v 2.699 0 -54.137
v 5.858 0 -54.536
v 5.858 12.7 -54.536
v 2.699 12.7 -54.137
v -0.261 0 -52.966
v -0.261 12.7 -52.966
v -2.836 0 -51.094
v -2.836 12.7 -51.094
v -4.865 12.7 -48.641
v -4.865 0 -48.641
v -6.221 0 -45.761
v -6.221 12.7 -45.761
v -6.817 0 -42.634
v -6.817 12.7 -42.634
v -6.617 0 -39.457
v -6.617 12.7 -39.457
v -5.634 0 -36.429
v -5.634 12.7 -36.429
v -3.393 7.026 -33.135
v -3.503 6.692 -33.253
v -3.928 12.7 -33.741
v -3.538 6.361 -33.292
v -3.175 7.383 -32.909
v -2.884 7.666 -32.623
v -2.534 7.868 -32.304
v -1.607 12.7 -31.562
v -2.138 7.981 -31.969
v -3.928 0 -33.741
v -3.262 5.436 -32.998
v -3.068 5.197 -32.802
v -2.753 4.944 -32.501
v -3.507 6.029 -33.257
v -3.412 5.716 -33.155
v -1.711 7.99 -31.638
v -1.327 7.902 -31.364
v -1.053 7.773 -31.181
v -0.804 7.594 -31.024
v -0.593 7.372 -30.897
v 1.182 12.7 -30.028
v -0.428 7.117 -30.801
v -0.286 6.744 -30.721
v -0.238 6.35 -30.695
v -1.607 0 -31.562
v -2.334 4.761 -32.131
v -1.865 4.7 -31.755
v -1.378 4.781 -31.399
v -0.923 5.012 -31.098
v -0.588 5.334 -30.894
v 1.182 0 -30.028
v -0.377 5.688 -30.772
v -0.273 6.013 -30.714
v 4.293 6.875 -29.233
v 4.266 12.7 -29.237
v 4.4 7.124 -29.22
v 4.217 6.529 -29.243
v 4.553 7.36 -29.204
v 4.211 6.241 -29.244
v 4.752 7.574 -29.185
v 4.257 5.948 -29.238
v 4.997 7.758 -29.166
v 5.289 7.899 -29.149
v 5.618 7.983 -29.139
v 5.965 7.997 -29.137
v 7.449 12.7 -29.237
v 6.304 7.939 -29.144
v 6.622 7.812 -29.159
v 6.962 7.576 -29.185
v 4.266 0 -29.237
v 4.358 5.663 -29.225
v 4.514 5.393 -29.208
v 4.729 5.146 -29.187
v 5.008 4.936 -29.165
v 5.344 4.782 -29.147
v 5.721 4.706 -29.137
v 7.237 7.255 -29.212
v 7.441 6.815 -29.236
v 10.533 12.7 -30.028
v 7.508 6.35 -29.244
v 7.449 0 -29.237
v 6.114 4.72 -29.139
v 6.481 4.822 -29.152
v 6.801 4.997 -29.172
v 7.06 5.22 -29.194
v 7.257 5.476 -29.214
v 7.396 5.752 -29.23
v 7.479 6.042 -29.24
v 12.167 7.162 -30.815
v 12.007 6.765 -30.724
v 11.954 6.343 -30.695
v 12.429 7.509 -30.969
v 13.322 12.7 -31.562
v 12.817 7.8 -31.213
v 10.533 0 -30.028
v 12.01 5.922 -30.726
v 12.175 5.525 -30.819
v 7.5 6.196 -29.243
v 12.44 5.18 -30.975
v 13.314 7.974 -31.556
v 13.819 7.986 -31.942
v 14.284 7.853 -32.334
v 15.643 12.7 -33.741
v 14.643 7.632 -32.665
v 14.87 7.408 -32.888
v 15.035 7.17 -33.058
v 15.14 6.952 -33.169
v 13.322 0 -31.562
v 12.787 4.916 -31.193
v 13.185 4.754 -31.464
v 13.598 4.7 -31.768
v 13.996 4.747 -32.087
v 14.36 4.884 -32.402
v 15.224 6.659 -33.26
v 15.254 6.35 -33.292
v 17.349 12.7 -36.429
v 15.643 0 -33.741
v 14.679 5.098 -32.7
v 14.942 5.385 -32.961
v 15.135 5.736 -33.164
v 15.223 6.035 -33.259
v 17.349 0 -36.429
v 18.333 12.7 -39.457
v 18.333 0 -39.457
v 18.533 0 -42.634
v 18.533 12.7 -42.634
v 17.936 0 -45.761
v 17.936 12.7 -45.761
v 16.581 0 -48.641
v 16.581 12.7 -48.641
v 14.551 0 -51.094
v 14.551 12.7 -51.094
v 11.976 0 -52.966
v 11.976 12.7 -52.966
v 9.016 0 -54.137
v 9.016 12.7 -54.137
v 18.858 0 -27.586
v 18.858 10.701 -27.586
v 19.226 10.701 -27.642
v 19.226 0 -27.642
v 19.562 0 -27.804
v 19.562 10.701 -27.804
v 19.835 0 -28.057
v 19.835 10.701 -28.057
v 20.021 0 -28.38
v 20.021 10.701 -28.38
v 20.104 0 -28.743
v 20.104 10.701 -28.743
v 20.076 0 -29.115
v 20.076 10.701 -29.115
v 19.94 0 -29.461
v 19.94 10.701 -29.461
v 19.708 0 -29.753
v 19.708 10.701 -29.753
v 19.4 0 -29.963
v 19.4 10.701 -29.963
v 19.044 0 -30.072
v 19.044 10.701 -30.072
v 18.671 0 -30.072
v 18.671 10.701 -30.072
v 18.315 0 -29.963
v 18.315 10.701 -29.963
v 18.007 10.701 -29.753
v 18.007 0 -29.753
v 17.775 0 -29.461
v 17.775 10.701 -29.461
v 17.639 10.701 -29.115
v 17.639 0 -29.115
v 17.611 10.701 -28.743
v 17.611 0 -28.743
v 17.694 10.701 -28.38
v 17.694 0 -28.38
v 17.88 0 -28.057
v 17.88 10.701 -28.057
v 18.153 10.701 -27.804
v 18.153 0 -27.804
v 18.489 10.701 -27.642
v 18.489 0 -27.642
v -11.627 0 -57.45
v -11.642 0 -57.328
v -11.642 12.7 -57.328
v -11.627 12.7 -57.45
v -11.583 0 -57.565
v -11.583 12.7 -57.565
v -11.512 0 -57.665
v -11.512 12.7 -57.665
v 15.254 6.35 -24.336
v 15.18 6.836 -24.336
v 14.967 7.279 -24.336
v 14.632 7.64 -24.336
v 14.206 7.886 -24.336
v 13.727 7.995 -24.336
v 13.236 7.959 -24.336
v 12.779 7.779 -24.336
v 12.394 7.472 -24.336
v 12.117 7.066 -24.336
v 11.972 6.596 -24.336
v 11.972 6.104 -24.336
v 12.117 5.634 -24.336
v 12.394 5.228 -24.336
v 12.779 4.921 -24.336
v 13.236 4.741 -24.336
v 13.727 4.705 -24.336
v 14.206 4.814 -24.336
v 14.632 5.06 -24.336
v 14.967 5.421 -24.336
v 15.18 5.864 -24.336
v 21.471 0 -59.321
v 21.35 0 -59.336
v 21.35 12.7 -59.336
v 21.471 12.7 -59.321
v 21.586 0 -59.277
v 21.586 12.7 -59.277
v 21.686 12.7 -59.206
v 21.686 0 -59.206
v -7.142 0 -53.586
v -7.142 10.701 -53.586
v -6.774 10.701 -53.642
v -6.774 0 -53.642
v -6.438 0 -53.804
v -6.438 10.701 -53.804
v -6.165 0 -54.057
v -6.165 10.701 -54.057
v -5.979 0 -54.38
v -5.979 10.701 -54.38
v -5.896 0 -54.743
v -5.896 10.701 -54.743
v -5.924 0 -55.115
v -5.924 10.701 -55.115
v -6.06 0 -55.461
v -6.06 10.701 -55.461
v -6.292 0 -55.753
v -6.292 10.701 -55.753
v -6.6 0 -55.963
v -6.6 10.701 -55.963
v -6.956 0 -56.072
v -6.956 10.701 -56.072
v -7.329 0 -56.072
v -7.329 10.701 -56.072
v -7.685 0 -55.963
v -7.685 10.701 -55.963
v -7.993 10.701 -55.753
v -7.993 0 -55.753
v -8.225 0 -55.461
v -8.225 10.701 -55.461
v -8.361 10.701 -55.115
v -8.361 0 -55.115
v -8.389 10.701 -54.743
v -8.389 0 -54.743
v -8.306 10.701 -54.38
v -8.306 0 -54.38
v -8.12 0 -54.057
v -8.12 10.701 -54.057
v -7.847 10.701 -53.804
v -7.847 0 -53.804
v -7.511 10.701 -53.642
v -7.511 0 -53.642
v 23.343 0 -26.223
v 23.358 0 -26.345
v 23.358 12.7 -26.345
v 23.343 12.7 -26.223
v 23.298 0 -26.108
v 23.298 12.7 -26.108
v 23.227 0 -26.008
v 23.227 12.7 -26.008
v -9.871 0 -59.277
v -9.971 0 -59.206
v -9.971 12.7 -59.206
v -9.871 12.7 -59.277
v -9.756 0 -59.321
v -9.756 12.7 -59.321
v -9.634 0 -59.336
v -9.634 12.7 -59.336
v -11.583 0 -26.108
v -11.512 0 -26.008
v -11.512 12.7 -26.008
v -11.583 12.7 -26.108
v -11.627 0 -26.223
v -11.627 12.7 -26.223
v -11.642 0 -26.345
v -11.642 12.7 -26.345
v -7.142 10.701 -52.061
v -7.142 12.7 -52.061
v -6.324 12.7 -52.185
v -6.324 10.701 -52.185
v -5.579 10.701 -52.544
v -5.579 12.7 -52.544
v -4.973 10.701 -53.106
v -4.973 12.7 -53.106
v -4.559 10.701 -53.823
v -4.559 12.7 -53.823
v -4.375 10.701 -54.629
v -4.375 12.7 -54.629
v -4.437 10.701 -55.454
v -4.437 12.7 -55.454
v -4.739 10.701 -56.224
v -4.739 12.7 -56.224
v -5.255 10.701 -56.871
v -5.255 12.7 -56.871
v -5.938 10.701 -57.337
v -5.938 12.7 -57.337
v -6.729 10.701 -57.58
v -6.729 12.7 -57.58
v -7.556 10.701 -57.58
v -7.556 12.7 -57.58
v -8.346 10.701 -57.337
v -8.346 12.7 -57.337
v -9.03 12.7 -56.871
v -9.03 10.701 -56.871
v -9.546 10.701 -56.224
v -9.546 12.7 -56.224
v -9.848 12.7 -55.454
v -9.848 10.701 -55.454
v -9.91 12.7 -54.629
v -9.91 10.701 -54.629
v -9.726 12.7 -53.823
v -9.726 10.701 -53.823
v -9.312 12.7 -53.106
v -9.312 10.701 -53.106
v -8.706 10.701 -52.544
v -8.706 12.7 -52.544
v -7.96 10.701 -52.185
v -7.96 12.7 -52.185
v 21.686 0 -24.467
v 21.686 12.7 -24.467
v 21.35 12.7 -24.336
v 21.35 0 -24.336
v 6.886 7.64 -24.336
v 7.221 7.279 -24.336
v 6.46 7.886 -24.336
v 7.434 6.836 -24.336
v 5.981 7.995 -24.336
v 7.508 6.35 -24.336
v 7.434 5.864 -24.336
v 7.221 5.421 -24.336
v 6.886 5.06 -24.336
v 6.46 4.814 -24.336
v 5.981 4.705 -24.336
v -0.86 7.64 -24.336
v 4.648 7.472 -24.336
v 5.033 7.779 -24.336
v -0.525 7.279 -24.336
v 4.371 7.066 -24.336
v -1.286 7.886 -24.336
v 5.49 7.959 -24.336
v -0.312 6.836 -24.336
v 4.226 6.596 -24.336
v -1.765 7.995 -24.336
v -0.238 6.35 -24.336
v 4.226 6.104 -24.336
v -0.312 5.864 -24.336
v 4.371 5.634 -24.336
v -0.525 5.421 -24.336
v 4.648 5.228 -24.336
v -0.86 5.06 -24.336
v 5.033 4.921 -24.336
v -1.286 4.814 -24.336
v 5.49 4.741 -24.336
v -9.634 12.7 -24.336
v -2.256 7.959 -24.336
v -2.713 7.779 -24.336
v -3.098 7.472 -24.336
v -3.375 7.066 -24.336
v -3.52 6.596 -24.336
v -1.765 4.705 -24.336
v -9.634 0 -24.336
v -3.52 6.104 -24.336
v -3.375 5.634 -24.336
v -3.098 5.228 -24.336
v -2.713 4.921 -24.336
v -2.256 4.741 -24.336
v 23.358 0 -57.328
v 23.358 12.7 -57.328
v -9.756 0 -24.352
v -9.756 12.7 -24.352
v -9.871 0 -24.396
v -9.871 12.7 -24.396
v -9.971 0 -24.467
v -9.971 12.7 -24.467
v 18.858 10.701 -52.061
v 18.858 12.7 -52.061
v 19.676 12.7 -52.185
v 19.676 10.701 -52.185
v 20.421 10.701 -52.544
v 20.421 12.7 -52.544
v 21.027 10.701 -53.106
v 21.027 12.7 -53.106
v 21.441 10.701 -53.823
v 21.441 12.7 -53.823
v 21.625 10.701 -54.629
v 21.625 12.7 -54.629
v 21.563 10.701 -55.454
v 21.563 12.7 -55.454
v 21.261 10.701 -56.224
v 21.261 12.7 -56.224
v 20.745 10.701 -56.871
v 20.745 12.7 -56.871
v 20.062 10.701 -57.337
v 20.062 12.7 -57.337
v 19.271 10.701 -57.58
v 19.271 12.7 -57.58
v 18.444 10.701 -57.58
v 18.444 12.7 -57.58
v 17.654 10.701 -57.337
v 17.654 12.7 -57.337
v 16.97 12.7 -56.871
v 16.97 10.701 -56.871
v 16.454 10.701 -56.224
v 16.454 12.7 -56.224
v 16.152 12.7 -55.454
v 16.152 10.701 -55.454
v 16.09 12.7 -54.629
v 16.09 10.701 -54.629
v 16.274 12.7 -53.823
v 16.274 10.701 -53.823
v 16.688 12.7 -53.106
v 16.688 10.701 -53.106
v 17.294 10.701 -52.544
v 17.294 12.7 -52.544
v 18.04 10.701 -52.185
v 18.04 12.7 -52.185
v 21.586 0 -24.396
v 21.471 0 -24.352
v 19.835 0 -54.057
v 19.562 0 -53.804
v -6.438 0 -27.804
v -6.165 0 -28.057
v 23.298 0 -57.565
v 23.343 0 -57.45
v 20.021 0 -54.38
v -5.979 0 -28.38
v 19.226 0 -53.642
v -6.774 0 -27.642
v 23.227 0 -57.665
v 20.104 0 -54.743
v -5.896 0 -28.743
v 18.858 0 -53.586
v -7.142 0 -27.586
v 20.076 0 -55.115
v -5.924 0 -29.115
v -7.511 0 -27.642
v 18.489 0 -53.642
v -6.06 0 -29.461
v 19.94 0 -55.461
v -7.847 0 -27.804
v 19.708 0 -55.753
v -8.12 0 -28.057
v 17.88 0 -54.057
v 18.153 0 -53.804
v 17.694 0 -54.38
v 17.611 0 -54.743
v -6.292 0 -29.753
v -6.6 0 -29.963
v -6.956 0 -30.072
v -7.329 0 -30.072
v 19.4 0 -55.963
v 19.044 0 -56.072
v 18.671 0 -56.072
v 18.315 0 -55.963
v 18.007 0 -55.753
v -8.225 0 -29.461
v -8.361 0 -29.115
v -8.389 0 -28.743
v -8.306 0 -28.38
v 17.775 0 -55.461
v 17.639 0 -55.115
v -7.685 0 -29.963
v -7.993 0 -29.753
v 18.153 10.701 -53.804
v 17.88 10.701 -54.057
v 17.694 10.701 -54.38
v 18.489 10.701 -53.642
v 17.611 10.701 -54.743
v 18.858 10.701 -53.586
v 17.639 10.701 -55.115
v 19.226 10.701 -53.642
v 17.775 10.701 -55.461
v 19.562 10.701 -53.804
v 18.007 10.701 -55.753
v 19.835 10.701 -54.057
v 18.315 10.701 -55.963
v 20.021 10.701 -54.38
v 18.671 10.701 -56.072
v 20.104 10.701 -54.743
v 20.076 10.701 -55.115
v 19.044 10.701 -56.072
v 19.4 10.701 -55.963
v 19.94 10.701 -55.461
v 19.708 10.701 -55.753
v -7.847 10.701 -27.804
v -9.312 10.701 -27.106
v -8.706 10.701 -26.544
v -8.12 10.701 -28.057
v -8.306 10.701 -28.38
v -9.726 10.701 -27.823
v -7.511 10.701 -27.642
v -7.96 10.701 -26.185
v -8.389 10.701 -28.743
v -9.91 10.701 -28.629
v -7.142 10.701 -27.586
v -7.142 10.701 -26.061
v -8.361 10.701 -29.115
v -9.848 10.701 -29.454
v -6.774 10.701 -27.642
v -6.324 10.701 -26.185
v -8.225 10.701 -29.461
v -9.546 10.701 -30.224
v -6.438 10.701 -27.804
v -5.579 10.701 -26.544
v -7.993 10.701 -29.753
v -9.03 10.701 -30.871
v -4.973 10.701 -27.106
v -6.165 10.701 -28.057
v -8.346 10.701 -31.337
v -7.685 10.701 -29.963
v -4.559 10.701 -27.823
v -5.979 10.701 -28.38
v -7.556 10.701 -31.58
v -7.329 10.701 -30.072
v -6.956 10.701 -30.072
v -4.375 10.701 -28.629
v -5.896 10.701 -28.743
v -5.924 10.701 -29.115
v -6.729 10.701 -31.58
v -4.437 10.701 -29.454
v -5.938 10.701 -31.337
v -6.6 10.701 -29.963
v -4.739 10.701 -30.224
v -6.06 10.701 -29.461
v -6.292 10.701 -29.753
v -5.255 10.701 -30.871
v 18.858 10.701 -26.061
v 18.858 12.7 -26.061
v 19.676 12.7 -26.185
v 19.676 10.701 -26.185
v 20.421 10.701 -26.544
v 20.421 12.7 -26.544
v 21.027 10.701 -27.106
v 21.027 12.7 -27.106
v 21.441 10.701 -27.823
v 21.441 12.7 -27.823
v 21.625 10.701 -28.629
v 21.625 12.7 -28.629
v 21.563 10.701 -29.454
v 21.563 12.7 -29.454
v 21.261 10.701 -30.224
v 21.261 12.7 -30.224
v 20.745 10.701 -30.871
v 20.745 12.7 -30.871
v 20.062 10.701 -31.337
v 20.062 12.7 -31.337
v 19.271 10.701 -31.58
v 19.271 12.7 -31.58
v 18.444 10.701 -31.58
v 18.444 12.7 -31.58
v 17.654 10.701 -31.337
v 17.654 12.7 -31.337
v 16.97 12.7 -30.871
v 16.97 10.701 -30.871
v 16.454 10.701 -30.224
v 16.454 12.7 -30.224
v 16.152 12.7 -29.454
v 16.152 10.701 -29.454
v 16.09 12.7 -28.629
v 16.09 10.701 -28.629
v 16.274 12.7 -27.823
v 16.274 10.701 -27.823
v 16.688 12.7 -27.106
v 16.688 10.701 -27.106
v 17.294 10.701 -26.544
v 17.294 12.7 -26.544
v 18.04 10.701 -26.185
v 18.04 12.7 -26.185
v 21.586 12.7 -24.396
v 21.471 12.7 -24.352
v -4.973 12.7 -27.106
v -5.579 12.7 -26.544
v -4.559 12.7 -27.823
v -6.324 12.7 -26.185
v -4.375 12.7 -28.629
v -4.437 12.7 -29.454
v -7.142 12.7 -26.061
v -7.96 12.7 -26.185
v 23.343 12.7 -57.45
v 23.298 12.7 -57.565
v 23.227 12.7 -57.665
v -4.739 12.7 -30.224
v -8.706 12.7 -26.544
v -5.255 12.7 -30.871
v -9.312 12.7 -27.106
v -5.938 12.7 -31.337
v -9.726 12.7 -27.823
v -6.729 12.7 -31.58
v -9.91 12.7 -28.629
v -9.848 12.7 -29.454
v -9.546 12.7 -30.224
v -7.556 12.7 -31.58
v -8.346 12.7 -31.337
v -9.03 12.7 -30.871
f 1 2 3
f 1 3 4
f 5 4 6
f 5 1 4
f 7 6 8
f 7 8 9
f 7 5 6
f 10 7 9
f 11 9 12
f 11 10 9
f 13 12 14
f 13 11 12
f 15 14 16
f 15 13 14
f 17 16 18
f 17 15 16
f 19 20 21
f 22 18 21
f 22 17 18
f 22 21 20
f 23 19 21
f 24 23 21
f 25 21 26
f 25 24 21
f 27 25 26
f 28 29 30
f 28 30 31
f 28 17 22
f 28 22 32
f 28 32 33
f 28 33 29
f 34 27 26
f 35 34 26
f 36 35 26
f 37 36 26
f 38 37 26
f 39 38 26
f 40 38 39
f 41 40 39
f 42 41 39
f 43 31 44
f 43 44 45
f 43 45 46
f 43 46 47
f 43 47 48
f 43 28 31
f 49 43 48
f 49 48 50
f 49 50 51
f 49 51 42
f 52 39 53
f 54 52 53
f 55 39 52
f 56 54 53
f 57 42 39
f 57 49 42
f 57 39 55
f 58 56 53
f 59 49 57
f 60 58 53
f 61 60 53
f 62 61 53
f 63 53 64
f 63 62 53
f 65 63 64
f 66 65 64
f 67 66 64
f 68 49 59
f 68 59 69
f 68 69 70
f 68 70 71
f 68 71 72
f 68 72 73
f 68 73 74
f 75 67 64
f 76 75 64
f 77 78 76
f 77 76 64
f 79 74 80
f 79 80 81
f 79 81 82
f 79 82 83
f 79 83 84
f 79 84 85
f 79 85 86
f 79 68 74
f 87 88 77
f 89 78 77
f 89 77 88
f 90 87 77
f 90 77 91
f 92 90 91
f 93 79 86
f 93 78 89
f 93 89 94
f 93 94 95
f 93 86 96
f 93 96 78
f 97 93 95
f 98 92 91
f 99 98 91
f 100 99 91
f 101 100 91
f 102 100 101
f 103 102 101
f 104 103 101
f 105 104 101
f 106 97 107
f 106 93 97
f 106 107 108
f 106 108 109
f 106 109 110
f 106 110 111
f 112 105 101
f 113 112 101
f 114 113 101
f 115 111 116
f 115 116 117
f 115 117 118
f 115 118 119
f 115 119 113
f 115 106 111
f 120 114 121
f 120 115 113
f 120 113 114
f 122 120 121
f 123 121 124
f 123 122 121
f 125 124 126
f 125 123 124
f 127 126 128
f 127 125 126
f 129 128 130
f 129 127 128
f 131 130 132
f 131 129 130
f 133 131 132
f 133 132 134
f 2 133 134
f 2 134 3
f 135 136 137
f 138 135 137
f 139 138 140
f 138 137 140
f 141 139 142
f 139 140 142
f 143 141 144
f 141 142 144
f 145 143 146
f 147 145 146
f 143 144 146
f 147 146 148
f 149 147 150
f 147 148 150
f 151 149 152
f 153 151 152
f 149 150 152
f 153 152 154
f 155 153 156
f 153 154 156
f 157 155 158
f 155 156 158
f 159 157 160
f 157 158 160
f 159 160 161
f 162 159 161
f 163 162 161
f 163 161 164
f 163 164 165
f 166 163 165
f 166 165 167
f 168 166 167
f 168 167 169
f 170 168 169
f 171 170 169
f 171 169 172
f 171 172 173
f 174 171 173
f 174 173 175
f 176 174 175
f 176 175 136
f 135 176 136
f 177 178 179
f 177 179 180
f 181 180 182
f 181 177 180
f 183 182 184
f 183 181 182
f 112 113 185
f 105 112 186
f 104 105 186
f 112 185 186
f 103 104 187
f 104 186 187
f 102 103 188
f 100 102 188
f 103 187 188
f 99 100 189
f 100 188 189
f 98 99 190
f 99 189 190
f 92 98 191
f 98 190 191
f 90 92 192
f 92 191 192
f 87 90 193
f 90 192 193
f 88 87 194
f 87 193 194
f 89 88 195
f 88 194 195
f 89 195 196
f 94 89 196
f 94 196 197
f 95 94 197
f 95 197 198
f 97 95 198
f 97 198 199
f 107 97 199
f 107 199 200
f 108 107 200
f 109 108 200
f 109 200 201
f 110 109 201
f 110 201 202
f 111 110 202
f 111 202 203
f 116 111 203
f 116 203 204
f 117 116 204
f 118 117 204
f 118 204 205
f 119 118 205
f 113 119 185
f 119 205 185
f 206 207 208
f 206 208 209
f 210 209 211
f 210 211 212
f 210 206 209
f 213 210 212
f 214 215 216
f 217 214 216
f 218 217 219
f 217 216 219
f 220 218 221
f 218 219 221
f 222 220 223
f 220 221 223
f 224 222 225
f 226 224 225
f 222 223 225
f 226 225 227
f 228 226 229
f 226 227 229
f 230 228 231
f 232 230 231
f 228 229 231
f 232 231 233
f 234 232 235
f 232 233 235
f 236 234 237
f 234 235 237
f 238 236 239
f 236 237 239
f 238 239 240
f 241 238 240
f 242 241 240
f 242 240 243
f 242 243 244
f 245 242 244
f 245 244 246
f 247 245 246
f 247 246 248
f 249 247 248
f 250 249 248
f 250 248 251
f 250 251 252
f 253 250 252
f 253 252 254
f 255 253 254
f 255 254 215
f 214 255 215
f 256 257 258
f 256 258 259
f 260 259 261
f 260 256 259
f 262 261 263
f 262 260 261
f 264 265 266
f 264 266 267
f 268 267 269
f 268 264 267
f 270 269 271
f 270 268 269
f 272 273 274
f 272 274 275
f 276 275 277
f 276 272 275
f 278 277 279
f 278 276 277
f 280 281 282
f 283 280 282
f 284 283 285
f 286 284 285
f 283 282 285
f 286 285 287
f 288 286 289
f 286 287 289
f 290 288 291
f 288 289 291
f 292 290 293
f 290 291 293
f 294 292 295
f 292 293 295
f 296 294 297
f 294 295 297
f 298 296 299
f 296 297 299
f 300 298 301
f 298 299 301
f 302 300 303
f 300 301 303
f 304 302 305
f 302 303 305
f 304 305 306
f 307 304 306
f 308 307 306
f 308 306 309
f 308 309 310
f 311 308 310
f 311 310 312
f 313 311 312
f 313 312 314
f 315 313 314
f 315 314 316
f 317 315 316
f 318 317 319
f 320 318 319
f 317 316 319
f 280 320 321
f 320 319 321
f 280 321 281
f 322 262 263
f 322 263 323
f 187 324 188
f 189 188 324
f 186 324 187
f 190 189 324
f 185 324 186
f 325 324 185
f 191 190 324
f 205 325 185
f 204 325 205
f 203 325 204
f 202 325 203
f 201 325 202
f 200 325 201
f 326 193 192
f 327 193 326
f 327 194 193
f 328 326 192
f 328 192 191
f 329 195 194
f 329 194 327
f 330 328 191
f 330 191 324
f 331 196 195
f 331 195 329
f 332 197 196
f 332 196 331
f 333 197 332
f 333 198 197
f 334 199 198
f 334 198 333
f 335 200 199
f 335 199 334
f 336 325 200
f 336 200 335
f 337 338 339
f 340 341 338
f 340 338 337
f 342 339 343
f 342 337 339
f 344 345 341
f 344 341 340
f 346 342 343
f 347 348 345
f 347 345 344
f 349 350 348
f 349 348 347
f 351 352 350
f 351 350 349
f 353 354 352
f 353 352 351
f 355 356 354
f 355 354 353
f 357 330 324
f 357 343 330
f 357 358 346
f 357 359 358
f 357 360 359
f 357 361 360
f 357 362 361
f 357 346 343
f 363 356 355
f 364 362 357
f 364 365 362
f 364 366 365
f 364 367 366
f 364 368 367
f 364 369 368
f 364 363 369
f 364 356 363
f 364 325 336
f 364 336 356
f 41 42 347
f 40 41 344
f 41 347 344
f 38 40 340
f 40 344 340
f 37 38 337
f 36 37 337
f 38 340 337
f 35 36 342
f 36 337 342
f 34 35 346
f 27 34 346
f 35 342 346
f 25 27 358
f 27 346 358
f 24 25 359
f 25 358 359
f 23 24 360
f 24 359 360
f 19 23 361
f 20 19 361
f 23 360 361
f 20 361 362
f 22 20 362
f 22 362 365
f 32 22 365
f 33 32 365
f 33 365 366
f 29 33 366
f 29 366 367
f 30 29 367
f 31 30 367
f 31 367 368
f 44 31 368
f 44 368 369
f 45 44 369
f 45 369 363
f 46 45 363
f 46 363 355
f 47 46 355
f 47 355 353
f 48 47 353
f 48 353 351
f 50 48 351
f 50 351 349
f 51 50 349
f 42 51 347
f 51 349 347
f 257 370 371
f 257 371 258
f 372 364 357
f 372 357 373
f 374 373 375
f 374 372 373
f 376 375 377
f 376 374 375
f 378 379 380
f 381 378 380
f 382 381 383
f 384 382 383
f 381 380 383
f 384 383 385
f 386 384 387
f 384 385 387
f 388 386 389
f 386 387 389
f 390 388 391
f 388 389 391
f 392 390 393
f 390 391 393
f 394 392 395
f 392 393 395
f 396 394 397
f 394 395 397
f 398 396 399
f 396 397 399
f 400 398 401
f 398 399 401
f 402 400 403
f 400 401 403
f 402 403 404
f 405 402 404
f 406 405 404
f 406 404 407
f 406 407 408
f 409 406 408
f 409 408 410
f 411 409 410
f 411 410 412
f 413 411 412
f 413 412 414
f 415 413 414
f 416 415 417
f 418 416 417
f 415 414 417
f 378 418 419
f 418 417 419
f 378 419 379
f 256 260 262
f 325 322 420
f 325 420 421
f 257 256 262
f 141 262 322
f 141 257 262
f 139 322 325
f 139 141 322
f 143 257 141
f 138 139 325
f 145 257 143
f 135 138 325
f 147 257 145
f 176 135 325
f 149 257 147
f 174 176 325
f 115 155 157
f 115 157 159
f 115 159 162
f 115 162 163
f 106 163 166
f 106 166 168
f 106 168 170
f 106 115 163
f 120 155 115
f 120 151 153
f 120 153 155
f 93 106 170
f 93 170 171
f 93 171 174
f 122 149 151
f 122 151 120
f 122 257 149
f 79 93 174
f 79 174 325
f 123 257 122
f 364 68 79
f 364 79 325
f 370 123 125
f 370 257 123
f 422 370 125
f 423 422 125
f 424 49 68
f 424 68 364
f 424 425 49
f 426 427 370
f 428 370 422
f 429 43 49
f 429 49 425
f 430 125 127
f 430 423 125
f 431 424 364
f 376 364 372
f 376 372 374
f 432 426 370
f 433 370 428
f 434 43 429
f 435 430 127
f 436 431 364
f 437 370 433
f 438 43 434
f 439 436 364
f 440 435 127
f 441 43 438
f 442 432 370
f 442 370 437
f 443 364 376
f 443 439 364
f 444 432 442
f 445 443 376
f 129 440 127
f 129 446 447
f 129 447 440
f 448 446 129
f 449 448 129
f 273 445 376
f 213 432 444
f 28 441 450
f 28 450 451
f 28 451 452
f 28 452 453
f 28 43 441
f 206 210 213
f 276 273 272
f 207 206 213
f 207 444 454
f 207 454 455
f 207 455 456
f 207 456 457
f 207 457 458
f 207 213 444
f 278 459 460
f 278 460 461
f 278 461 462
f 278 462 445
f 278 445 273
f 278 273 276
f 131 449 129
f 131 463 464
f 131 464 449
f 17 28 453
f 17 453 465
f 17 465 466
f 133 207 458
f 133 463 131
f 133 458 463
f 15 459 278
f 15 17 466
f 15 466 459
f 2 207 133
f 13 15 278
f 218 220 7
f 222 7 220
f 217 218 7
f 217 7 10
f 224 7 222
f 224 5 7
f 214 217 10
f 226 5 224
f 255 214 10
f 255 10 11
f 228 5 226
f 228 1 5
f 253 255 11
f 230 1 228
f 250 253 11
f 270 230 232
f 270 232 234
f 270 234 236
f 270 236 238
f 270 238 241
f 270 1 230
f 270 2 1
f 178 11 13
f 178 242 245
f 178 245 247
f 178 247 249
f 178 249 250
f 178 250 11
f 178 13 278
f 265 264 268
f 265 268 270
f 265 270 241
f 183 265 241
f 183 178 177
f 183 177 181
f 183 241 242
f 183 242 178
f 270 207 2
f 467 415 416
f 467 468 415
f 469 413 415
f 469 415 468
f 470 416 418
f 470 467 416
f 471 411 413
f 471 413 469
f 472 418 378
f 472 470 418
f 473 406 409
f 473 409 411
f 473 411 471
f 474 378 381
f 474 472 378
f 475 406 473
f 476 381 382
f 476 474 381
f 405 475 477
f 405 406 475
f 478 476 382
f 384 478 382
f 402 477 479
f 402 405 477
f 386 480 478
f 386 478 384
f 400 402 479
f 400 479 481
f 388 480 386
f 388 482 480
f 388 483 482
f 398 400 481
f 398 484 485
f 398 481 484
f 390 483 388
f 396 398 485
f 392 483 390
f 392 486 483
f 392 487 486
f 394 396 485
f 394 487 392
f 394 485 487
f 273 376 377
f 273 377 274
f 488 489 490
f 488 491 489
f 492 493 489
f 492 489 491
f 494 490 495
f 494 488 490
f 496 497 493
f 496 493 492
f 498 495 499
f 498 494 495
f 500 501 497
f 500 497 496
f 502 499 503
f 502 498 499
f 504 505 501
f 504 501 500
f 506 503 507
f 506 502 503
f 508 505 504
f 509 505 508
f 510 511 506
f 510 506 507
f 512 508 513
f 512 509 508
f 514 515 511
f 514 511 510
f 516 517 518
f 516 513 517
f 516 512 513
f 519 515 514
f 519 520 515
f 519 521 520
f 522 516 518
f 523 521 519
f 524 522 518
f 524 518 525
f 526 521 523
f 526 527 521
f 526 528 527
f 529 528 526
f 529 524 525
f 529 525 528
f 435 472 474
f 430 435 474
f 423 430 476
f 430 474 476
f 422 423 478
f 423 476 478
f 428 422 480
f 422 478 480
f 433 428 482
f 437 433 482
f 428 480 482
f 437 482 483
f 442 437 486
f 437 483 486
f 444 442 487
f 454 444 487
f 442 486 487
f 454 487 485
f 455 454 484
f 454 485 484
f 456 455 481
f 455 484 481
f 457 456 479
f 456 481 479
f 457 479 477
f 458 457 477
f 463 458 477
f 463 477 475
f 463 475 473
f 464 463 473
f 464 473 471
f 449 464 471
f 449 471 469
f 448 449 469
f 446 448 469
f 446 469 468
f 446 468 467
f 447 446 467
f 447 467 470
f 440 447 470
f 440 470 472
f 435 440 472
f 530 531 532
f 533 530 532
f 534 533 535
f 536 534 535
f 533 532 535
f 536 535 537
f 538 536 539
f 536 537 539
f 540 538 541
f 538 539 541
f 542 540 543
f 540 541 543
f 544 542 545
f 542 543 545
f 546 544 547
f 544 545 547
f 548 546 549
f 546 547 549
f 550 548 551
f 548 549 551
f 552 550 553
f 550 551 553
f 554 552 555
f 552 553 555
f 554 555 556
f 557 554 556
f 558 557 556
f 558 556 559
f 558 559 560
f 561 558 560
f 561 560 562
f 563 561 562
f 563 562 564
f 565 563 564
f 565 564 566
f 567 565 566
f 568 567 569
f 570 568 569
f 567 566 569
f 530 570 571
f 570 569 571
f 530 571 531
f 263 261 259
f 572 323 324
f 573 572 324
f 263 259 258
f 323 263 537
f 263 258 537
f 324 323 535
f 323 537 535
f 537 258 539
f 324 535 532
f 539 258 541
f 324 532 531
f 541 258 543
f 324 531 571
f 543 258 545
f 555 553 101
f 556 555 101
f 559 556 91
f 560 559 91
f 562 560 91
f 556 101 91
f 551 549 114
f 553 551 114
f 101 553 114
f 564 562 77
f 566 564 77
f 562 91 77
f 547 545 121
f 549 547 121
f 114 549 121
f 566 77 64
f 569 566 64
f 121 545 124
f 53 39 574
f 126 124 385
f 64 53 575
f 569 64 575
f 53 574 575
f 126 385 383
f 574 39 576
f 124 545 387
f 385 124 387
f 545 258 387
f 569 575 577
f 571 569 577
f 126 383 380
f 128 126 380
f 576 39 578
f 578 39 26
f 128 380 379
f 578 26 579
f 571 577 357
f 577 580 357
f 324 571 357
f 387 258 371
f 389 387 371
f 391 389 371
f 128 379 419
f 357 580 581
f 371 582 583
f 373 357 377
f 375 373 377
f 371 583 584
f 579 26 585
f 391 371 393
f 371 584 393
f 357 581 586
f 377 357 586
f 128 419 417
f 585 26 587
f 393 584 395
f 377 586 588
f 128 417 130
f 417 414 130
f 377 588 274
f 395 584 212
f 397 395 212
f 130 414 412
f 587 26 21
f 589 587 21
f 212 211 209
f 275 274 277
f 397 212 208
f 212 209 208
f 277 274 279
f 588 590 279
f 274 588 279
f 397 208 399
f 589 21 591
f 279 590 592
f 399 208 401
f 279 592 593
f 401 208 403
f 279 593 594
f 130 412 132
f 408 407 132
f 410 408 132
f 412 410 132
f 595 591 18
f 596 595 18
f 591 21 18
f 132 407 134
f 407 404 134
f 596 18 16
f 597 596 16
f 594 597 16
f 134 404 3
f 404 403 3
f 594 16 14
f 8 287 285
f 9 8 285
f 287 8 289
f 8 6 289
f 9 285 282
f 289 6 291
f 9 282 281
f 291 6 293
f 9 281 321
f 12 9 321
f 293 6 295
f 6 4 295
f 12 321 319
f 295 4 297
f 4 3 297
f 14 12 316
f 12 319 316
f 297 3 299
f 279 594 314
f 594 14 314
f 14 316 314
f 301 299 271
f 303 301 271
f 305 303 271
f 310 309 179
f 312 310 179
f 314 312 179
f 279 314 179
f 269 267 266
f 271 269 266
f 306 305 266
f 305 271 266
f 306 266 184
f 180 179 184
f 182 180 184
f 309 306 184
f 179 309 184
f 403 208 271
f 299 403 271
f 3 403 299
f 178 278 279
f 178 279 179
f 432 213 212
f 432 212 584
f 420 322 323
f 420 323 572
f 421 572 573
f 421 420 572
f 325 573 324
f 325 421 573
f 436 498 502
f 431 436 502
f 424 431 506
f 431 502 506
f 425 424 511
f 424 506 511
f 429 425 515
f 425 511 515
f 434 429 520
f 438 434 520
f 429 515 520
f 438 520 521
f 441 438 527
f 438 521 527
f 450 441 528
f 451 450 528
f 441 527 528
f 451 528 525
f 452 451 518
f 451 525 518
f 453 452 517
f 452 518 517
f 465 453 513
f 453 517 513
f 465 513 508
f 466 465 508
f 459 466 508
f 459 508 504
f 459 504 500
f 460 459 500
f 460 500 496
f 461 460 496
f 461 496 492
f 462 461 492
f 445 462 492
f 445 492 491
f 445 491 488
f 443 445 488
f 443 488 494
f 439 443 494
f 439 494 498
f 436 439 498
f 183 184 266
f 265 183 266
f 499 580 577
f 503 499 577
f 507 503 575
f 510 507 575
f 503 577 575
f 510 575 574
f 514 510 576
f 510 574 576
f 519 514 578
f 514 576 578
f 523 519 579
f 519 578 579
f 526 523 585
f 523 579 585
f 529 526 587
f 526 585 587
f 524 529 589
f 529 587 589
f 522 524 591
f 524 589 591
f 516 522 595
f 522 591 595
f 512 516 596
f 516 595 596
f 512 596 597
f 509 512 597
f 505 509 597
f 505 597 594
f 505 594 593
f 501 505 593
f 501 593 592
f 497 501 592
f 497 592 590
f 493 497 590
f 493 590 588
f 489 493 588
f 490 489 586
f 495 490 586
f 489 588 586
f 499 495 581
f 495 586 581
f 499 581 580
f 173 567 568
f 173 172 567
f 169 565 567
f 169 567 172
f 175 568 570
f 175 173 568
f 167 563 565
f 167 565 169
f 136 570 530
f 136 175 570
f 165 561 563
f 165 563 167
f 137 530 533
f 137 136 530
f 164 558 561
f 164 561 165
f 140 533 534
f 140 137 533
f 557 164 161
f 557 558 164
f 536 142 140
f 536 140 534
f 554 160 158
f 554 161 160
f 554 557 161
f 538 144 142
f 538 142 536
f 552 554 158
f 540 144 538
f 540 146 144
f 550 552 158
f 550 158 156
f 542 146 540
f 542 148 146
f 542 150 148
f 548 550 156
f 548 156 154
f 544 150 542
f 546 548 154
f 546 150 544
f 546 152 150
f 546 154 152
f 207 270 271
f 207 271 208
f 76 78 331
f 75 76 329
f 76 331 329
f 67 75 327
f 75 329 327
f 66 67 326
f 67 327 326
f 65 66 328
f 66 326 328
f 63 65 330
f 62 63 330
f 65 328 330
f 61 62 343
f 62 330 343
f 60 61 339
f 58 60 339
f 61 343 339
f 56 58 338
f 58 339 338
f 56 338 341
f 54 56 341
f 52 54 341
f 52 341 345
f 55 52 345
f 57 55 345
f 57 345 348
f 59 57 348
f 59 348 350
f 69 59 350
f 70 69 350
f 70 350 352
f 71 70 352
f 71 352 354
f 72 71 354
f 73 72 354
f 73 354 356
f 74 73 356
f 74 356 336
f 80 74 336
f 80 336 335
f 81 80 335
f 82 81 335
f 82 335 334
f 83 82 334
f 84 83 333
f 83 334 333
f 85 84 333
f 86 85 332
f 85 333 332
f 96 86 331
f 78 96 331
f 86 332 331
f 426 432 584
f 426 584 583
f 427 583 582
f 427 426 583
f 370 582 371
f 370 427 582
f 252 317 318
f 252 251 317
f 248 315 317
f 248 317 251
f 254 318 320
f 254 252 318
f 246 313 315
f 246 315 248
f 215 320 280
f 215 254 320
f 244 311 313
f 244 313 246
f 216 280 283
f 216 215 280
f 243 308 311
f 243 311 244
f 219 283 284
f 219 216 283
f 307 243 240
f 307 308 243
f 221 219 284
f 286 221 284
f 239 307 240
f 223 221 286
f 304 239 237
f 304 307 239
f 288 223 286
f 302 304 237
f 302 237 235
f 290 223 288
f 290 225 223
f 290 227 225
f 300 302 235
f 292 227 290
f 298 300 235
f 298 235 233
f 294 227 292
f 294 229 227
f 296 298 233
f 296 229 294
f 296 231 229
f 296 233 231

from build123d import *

# Parameters (mm, degrees)
SKETCH1_R           = 12.7
SKETCH1_R_2         = 1.65
BOSS_EXTRUDE1_DEPTH = 12.7
SKETCH2_R           = 1.65
CUT_EXTRUDE1_DEPTH  = 12.7
SKETCH3_R           = 2.77495
CUT_EXTRUDE3_DEPTH  = 1.99898
SKETCH7_R           = 1.65
BOSS_EXTRUDE2_DEPTH = 10.70102
SKETCH8_R           = 1.65
BOSS_EXTRUDE3_DEPTH = 10.70102
SKETCH9_R           = 1.65
BOSS_EXTRUDE4_DEPTH = 10.70102
SKETCH10_R          = 1.65
BOSS_EXTRUDE5_DEPTH = 10.70102
SKETCH12_R          = 1.25
CUT_EXTRUDE4_DEPTH  = 12.7
SKETCH11_R          = 1.25
CUT_EXTRUDE5_DEPTH  = 12.7


with BuildPart() as part:
    # Sketch1 → Boss-Extrude1 (new body)
    with BuildSketch(Plane(origin=(0, 0, 0), x_dir=(1, 0, 0), z_dir=(0, 1, 0))):
        with BuildLine():
            Line((21.686311219, 59.206008809), (23.227161891, 57.665158137))
            ThreePointArc((23.227161891, 57.665158137), (23.323849078, 57.508955756), (23.357596674, 57.328376976))
            Line((23.357596674, 57.328376976), (23.357596674, 26.344510207))
            ThreePointArc((23.357596674, 26.344510207), (23.323849078, 26.163931427), (23.227161891, 26.007729046))
            Line((23.227161891, 26.007729046), (21.686311219, 24.466878374))
            ThreePointArc((21.686311219, 24.466878374), (21.530108838, 24.370191187), (21.349530059, 24.336443591))
            Line((21.349530059, 24.336443591), (-9.634336711, 24.336443591))
            ThreePointArc((-9.634336711, 24.336443591), (-9.814915491, 24.370191187), (-9.971117871, 24.466878374))
            Line((-9.971117871, 24.466878374), (-11.511968543, 26.007729046))
            ThreePointArc((-11.511968543, 26.007729046), (-11.60865573, 26.163931427), (-11.642403326, 26.344510207))
            Line((-11.642403326, 26.344510207), (-11.642403326, 57.328376976))
            ThreePointArc((-11.642403326, 57.328376976), (-11.60865573, 57.508955756), (-11.511968543, 57.665158137))
            Line((-11.511968543, 57.665158137), (-9.971117871, 59.206008809))
            ThreePointArc((-9.971117871, 59.206008809), (-9.814915491, 59.302695995), (-9.634336711, 59.336443591))
            Line((-9.634336711, 59.336443591), (21.349530059, 59.336443591))
            ThreePointArc((21.349530059, 59.336443591), (21.530108838, 59.302695995), (21.686311219, 59.206008809))
        make_face()
        with Locations(Location((5.857596674, 41.836443591, 0), (0, 0, 90))):
            Circle(SKETCH1_R, mode=Mode.SUBTRACT)
        with Locations(Location((18.857596674, 54.836443591, 0), (0, 0, 90))):
            Circle(SKETCH1_R_2, mode=Mode.SUBTRACT)
        with Locations(Location((18.857596674, 28.836443591, 0), (0, 0, 90))):
            Circle(SKETCH1_R_2, mode=Mode.SUBTRACT)
        with Locations(Location((-7.142403326, 54.836443591, 0), (0, 0, 90))):
            Circle(SKETCH1_R_2, mode=Mode.SUBTRACT)
        with Locations(Location((-7.142403326, 28.836443591, 0), (0, 0, 90))):
            Circle(SKETCH1_R_2, mode=Mode.SUBTRACT)
    extrude(amount=BOSS_EXTRUDE1_DEPTH)

    # Sketch2 → Cut-Extrude1 (cut)
    with BuildSketch(Plane.XY.offset(-24.336443591)):
        with Locations((-1.888370018, 6.35)):
            Circle(SKETCH2_R)
        with Locations((13.603563366, 6.35)):
            Circle(SKETCH2_R)
        with Locations((5.857596674, 6.35)):
            Circle(SKETCH2_R)
    extrude(amount=-CUT_EXTRUDE1_DEPTH, mode=Mode.SUBTRACT)

    # Sketch3 → Cut-Extrude3 (cut)
    with BuildSketch(Plane(origin=(0, 12.7, 0), x_dir=(1, 0, 0), z_dir=(0, 1, 0))):
        with Locations(Location((-7.142403326, 54.836443591, 0), (0, 0, 270))):
            Circle(SKETCH3_R)
        with Locations(Location((18.857596674, 54.836443591, 0), (0, 0, 270))):
            Circle(SKETCH3_R)
        with Locations(Location((-7.142403326, 28.836443591, 0), (0, 0, 270))):
            Circle(SKETCH3_R)
        with Locations(Location((18.857596674, 28.836443591, 0), (0, 0, 270))):
            Circle(SKETCH3_R)
    extrude(amount=-CUT_EXTRUDE3_DEPTH, mode=Mode.SUBTRACT)

    # Sketch7 → Boss-Extrude2 (add, through all)
    with BuildSketch(Plane(origin=(0, 10.70102, 0), x_dir=(1, 0, 0), z_dir=(0, 1, 0))):
        with Locations((-7.142403326, 28.836443591)):
            Circle(SKETCH7_R)
    extrude(amount=-BOSS_EXTRUDE2_DEPTH)

    # Sketch8 → Boss-Extrude3 (add, through all)
    with BuildSketch(Plane(origin=(0, 10.70102, 0), x_dir=(1, 0, 0), z_dir=(0, 1, 0))):
        with Locations((-7.142403326, 54.836443591)):
            Circle(SKETCH8_R)
    extrude(amount=-BOSS_EXTRUDE3_DEPTH)

    # Sketch9 → Boss-Extrude4 (add, through all)
    with BuildSketch(Plane(origin=(0, 10.70102, 0), x_dir=(1, 0, 0), z_dir=(0, 1, 0))):
        with Locations((18.857596674, 54.836443591)):
            Circle(SKETCH9_R)
    extrude(amount=-BOSS_EXTRUDE4_DEPTH)

    # Sketch10 → Boss-Extrude5 (add, through all)
    with BuildSketch(Plane(origin=(0, 10.70102, 0), x_dir=(1, 0, 0), z_dir=(0, 1, 0))):
        with Locations((18.857596674, 28.836443591)):
            Circle(SKETCH10_R)
    extrude(amount=-BOSS_EXTRUDE5_DEPTH)

    # Sketch12 → Cut-Extrude4 (cut)
    with BuildSketch(Plane(origin=(0, 10.70102, 0), x_dir=(1, 0, 0), z_dir=(0, 1, 0))):
        with Locations(Location((18.857596674, 54.836443591, 0), (0, 0, 270))):
            Circle(SKETCH12_R)
        with Locations(Location((-7.142403326, 28.836443591, 0), (0, 0, 270))):
            Circle(SKETCH12_R)
        with Locations(Location((18.857596674, 28.836443591, 0), (0, 0, 270))):
            Circle(SKETCH12_R)
    extrude(amount=-CUT_EXTRUDE4_DEPTH, mode=Mode.SUBTRACT)

    # Sketch11 → Cut-Extrude5 (cut)
    with BuildSketch(Plane(origin=(0, 10.70102, 0), x_dir=(1, 0, 0), z_dir=(0, 1, 0))):
        with Locations(Location((-7.142403326, 54.836443591, 0), (0, 0, 270))):
            Circle(SKETCH11_R)
    extrude(amount=-CUT_EXTRUDE5_DEPTH, mode=Mode.SUBTRACT)


solid = part.part
